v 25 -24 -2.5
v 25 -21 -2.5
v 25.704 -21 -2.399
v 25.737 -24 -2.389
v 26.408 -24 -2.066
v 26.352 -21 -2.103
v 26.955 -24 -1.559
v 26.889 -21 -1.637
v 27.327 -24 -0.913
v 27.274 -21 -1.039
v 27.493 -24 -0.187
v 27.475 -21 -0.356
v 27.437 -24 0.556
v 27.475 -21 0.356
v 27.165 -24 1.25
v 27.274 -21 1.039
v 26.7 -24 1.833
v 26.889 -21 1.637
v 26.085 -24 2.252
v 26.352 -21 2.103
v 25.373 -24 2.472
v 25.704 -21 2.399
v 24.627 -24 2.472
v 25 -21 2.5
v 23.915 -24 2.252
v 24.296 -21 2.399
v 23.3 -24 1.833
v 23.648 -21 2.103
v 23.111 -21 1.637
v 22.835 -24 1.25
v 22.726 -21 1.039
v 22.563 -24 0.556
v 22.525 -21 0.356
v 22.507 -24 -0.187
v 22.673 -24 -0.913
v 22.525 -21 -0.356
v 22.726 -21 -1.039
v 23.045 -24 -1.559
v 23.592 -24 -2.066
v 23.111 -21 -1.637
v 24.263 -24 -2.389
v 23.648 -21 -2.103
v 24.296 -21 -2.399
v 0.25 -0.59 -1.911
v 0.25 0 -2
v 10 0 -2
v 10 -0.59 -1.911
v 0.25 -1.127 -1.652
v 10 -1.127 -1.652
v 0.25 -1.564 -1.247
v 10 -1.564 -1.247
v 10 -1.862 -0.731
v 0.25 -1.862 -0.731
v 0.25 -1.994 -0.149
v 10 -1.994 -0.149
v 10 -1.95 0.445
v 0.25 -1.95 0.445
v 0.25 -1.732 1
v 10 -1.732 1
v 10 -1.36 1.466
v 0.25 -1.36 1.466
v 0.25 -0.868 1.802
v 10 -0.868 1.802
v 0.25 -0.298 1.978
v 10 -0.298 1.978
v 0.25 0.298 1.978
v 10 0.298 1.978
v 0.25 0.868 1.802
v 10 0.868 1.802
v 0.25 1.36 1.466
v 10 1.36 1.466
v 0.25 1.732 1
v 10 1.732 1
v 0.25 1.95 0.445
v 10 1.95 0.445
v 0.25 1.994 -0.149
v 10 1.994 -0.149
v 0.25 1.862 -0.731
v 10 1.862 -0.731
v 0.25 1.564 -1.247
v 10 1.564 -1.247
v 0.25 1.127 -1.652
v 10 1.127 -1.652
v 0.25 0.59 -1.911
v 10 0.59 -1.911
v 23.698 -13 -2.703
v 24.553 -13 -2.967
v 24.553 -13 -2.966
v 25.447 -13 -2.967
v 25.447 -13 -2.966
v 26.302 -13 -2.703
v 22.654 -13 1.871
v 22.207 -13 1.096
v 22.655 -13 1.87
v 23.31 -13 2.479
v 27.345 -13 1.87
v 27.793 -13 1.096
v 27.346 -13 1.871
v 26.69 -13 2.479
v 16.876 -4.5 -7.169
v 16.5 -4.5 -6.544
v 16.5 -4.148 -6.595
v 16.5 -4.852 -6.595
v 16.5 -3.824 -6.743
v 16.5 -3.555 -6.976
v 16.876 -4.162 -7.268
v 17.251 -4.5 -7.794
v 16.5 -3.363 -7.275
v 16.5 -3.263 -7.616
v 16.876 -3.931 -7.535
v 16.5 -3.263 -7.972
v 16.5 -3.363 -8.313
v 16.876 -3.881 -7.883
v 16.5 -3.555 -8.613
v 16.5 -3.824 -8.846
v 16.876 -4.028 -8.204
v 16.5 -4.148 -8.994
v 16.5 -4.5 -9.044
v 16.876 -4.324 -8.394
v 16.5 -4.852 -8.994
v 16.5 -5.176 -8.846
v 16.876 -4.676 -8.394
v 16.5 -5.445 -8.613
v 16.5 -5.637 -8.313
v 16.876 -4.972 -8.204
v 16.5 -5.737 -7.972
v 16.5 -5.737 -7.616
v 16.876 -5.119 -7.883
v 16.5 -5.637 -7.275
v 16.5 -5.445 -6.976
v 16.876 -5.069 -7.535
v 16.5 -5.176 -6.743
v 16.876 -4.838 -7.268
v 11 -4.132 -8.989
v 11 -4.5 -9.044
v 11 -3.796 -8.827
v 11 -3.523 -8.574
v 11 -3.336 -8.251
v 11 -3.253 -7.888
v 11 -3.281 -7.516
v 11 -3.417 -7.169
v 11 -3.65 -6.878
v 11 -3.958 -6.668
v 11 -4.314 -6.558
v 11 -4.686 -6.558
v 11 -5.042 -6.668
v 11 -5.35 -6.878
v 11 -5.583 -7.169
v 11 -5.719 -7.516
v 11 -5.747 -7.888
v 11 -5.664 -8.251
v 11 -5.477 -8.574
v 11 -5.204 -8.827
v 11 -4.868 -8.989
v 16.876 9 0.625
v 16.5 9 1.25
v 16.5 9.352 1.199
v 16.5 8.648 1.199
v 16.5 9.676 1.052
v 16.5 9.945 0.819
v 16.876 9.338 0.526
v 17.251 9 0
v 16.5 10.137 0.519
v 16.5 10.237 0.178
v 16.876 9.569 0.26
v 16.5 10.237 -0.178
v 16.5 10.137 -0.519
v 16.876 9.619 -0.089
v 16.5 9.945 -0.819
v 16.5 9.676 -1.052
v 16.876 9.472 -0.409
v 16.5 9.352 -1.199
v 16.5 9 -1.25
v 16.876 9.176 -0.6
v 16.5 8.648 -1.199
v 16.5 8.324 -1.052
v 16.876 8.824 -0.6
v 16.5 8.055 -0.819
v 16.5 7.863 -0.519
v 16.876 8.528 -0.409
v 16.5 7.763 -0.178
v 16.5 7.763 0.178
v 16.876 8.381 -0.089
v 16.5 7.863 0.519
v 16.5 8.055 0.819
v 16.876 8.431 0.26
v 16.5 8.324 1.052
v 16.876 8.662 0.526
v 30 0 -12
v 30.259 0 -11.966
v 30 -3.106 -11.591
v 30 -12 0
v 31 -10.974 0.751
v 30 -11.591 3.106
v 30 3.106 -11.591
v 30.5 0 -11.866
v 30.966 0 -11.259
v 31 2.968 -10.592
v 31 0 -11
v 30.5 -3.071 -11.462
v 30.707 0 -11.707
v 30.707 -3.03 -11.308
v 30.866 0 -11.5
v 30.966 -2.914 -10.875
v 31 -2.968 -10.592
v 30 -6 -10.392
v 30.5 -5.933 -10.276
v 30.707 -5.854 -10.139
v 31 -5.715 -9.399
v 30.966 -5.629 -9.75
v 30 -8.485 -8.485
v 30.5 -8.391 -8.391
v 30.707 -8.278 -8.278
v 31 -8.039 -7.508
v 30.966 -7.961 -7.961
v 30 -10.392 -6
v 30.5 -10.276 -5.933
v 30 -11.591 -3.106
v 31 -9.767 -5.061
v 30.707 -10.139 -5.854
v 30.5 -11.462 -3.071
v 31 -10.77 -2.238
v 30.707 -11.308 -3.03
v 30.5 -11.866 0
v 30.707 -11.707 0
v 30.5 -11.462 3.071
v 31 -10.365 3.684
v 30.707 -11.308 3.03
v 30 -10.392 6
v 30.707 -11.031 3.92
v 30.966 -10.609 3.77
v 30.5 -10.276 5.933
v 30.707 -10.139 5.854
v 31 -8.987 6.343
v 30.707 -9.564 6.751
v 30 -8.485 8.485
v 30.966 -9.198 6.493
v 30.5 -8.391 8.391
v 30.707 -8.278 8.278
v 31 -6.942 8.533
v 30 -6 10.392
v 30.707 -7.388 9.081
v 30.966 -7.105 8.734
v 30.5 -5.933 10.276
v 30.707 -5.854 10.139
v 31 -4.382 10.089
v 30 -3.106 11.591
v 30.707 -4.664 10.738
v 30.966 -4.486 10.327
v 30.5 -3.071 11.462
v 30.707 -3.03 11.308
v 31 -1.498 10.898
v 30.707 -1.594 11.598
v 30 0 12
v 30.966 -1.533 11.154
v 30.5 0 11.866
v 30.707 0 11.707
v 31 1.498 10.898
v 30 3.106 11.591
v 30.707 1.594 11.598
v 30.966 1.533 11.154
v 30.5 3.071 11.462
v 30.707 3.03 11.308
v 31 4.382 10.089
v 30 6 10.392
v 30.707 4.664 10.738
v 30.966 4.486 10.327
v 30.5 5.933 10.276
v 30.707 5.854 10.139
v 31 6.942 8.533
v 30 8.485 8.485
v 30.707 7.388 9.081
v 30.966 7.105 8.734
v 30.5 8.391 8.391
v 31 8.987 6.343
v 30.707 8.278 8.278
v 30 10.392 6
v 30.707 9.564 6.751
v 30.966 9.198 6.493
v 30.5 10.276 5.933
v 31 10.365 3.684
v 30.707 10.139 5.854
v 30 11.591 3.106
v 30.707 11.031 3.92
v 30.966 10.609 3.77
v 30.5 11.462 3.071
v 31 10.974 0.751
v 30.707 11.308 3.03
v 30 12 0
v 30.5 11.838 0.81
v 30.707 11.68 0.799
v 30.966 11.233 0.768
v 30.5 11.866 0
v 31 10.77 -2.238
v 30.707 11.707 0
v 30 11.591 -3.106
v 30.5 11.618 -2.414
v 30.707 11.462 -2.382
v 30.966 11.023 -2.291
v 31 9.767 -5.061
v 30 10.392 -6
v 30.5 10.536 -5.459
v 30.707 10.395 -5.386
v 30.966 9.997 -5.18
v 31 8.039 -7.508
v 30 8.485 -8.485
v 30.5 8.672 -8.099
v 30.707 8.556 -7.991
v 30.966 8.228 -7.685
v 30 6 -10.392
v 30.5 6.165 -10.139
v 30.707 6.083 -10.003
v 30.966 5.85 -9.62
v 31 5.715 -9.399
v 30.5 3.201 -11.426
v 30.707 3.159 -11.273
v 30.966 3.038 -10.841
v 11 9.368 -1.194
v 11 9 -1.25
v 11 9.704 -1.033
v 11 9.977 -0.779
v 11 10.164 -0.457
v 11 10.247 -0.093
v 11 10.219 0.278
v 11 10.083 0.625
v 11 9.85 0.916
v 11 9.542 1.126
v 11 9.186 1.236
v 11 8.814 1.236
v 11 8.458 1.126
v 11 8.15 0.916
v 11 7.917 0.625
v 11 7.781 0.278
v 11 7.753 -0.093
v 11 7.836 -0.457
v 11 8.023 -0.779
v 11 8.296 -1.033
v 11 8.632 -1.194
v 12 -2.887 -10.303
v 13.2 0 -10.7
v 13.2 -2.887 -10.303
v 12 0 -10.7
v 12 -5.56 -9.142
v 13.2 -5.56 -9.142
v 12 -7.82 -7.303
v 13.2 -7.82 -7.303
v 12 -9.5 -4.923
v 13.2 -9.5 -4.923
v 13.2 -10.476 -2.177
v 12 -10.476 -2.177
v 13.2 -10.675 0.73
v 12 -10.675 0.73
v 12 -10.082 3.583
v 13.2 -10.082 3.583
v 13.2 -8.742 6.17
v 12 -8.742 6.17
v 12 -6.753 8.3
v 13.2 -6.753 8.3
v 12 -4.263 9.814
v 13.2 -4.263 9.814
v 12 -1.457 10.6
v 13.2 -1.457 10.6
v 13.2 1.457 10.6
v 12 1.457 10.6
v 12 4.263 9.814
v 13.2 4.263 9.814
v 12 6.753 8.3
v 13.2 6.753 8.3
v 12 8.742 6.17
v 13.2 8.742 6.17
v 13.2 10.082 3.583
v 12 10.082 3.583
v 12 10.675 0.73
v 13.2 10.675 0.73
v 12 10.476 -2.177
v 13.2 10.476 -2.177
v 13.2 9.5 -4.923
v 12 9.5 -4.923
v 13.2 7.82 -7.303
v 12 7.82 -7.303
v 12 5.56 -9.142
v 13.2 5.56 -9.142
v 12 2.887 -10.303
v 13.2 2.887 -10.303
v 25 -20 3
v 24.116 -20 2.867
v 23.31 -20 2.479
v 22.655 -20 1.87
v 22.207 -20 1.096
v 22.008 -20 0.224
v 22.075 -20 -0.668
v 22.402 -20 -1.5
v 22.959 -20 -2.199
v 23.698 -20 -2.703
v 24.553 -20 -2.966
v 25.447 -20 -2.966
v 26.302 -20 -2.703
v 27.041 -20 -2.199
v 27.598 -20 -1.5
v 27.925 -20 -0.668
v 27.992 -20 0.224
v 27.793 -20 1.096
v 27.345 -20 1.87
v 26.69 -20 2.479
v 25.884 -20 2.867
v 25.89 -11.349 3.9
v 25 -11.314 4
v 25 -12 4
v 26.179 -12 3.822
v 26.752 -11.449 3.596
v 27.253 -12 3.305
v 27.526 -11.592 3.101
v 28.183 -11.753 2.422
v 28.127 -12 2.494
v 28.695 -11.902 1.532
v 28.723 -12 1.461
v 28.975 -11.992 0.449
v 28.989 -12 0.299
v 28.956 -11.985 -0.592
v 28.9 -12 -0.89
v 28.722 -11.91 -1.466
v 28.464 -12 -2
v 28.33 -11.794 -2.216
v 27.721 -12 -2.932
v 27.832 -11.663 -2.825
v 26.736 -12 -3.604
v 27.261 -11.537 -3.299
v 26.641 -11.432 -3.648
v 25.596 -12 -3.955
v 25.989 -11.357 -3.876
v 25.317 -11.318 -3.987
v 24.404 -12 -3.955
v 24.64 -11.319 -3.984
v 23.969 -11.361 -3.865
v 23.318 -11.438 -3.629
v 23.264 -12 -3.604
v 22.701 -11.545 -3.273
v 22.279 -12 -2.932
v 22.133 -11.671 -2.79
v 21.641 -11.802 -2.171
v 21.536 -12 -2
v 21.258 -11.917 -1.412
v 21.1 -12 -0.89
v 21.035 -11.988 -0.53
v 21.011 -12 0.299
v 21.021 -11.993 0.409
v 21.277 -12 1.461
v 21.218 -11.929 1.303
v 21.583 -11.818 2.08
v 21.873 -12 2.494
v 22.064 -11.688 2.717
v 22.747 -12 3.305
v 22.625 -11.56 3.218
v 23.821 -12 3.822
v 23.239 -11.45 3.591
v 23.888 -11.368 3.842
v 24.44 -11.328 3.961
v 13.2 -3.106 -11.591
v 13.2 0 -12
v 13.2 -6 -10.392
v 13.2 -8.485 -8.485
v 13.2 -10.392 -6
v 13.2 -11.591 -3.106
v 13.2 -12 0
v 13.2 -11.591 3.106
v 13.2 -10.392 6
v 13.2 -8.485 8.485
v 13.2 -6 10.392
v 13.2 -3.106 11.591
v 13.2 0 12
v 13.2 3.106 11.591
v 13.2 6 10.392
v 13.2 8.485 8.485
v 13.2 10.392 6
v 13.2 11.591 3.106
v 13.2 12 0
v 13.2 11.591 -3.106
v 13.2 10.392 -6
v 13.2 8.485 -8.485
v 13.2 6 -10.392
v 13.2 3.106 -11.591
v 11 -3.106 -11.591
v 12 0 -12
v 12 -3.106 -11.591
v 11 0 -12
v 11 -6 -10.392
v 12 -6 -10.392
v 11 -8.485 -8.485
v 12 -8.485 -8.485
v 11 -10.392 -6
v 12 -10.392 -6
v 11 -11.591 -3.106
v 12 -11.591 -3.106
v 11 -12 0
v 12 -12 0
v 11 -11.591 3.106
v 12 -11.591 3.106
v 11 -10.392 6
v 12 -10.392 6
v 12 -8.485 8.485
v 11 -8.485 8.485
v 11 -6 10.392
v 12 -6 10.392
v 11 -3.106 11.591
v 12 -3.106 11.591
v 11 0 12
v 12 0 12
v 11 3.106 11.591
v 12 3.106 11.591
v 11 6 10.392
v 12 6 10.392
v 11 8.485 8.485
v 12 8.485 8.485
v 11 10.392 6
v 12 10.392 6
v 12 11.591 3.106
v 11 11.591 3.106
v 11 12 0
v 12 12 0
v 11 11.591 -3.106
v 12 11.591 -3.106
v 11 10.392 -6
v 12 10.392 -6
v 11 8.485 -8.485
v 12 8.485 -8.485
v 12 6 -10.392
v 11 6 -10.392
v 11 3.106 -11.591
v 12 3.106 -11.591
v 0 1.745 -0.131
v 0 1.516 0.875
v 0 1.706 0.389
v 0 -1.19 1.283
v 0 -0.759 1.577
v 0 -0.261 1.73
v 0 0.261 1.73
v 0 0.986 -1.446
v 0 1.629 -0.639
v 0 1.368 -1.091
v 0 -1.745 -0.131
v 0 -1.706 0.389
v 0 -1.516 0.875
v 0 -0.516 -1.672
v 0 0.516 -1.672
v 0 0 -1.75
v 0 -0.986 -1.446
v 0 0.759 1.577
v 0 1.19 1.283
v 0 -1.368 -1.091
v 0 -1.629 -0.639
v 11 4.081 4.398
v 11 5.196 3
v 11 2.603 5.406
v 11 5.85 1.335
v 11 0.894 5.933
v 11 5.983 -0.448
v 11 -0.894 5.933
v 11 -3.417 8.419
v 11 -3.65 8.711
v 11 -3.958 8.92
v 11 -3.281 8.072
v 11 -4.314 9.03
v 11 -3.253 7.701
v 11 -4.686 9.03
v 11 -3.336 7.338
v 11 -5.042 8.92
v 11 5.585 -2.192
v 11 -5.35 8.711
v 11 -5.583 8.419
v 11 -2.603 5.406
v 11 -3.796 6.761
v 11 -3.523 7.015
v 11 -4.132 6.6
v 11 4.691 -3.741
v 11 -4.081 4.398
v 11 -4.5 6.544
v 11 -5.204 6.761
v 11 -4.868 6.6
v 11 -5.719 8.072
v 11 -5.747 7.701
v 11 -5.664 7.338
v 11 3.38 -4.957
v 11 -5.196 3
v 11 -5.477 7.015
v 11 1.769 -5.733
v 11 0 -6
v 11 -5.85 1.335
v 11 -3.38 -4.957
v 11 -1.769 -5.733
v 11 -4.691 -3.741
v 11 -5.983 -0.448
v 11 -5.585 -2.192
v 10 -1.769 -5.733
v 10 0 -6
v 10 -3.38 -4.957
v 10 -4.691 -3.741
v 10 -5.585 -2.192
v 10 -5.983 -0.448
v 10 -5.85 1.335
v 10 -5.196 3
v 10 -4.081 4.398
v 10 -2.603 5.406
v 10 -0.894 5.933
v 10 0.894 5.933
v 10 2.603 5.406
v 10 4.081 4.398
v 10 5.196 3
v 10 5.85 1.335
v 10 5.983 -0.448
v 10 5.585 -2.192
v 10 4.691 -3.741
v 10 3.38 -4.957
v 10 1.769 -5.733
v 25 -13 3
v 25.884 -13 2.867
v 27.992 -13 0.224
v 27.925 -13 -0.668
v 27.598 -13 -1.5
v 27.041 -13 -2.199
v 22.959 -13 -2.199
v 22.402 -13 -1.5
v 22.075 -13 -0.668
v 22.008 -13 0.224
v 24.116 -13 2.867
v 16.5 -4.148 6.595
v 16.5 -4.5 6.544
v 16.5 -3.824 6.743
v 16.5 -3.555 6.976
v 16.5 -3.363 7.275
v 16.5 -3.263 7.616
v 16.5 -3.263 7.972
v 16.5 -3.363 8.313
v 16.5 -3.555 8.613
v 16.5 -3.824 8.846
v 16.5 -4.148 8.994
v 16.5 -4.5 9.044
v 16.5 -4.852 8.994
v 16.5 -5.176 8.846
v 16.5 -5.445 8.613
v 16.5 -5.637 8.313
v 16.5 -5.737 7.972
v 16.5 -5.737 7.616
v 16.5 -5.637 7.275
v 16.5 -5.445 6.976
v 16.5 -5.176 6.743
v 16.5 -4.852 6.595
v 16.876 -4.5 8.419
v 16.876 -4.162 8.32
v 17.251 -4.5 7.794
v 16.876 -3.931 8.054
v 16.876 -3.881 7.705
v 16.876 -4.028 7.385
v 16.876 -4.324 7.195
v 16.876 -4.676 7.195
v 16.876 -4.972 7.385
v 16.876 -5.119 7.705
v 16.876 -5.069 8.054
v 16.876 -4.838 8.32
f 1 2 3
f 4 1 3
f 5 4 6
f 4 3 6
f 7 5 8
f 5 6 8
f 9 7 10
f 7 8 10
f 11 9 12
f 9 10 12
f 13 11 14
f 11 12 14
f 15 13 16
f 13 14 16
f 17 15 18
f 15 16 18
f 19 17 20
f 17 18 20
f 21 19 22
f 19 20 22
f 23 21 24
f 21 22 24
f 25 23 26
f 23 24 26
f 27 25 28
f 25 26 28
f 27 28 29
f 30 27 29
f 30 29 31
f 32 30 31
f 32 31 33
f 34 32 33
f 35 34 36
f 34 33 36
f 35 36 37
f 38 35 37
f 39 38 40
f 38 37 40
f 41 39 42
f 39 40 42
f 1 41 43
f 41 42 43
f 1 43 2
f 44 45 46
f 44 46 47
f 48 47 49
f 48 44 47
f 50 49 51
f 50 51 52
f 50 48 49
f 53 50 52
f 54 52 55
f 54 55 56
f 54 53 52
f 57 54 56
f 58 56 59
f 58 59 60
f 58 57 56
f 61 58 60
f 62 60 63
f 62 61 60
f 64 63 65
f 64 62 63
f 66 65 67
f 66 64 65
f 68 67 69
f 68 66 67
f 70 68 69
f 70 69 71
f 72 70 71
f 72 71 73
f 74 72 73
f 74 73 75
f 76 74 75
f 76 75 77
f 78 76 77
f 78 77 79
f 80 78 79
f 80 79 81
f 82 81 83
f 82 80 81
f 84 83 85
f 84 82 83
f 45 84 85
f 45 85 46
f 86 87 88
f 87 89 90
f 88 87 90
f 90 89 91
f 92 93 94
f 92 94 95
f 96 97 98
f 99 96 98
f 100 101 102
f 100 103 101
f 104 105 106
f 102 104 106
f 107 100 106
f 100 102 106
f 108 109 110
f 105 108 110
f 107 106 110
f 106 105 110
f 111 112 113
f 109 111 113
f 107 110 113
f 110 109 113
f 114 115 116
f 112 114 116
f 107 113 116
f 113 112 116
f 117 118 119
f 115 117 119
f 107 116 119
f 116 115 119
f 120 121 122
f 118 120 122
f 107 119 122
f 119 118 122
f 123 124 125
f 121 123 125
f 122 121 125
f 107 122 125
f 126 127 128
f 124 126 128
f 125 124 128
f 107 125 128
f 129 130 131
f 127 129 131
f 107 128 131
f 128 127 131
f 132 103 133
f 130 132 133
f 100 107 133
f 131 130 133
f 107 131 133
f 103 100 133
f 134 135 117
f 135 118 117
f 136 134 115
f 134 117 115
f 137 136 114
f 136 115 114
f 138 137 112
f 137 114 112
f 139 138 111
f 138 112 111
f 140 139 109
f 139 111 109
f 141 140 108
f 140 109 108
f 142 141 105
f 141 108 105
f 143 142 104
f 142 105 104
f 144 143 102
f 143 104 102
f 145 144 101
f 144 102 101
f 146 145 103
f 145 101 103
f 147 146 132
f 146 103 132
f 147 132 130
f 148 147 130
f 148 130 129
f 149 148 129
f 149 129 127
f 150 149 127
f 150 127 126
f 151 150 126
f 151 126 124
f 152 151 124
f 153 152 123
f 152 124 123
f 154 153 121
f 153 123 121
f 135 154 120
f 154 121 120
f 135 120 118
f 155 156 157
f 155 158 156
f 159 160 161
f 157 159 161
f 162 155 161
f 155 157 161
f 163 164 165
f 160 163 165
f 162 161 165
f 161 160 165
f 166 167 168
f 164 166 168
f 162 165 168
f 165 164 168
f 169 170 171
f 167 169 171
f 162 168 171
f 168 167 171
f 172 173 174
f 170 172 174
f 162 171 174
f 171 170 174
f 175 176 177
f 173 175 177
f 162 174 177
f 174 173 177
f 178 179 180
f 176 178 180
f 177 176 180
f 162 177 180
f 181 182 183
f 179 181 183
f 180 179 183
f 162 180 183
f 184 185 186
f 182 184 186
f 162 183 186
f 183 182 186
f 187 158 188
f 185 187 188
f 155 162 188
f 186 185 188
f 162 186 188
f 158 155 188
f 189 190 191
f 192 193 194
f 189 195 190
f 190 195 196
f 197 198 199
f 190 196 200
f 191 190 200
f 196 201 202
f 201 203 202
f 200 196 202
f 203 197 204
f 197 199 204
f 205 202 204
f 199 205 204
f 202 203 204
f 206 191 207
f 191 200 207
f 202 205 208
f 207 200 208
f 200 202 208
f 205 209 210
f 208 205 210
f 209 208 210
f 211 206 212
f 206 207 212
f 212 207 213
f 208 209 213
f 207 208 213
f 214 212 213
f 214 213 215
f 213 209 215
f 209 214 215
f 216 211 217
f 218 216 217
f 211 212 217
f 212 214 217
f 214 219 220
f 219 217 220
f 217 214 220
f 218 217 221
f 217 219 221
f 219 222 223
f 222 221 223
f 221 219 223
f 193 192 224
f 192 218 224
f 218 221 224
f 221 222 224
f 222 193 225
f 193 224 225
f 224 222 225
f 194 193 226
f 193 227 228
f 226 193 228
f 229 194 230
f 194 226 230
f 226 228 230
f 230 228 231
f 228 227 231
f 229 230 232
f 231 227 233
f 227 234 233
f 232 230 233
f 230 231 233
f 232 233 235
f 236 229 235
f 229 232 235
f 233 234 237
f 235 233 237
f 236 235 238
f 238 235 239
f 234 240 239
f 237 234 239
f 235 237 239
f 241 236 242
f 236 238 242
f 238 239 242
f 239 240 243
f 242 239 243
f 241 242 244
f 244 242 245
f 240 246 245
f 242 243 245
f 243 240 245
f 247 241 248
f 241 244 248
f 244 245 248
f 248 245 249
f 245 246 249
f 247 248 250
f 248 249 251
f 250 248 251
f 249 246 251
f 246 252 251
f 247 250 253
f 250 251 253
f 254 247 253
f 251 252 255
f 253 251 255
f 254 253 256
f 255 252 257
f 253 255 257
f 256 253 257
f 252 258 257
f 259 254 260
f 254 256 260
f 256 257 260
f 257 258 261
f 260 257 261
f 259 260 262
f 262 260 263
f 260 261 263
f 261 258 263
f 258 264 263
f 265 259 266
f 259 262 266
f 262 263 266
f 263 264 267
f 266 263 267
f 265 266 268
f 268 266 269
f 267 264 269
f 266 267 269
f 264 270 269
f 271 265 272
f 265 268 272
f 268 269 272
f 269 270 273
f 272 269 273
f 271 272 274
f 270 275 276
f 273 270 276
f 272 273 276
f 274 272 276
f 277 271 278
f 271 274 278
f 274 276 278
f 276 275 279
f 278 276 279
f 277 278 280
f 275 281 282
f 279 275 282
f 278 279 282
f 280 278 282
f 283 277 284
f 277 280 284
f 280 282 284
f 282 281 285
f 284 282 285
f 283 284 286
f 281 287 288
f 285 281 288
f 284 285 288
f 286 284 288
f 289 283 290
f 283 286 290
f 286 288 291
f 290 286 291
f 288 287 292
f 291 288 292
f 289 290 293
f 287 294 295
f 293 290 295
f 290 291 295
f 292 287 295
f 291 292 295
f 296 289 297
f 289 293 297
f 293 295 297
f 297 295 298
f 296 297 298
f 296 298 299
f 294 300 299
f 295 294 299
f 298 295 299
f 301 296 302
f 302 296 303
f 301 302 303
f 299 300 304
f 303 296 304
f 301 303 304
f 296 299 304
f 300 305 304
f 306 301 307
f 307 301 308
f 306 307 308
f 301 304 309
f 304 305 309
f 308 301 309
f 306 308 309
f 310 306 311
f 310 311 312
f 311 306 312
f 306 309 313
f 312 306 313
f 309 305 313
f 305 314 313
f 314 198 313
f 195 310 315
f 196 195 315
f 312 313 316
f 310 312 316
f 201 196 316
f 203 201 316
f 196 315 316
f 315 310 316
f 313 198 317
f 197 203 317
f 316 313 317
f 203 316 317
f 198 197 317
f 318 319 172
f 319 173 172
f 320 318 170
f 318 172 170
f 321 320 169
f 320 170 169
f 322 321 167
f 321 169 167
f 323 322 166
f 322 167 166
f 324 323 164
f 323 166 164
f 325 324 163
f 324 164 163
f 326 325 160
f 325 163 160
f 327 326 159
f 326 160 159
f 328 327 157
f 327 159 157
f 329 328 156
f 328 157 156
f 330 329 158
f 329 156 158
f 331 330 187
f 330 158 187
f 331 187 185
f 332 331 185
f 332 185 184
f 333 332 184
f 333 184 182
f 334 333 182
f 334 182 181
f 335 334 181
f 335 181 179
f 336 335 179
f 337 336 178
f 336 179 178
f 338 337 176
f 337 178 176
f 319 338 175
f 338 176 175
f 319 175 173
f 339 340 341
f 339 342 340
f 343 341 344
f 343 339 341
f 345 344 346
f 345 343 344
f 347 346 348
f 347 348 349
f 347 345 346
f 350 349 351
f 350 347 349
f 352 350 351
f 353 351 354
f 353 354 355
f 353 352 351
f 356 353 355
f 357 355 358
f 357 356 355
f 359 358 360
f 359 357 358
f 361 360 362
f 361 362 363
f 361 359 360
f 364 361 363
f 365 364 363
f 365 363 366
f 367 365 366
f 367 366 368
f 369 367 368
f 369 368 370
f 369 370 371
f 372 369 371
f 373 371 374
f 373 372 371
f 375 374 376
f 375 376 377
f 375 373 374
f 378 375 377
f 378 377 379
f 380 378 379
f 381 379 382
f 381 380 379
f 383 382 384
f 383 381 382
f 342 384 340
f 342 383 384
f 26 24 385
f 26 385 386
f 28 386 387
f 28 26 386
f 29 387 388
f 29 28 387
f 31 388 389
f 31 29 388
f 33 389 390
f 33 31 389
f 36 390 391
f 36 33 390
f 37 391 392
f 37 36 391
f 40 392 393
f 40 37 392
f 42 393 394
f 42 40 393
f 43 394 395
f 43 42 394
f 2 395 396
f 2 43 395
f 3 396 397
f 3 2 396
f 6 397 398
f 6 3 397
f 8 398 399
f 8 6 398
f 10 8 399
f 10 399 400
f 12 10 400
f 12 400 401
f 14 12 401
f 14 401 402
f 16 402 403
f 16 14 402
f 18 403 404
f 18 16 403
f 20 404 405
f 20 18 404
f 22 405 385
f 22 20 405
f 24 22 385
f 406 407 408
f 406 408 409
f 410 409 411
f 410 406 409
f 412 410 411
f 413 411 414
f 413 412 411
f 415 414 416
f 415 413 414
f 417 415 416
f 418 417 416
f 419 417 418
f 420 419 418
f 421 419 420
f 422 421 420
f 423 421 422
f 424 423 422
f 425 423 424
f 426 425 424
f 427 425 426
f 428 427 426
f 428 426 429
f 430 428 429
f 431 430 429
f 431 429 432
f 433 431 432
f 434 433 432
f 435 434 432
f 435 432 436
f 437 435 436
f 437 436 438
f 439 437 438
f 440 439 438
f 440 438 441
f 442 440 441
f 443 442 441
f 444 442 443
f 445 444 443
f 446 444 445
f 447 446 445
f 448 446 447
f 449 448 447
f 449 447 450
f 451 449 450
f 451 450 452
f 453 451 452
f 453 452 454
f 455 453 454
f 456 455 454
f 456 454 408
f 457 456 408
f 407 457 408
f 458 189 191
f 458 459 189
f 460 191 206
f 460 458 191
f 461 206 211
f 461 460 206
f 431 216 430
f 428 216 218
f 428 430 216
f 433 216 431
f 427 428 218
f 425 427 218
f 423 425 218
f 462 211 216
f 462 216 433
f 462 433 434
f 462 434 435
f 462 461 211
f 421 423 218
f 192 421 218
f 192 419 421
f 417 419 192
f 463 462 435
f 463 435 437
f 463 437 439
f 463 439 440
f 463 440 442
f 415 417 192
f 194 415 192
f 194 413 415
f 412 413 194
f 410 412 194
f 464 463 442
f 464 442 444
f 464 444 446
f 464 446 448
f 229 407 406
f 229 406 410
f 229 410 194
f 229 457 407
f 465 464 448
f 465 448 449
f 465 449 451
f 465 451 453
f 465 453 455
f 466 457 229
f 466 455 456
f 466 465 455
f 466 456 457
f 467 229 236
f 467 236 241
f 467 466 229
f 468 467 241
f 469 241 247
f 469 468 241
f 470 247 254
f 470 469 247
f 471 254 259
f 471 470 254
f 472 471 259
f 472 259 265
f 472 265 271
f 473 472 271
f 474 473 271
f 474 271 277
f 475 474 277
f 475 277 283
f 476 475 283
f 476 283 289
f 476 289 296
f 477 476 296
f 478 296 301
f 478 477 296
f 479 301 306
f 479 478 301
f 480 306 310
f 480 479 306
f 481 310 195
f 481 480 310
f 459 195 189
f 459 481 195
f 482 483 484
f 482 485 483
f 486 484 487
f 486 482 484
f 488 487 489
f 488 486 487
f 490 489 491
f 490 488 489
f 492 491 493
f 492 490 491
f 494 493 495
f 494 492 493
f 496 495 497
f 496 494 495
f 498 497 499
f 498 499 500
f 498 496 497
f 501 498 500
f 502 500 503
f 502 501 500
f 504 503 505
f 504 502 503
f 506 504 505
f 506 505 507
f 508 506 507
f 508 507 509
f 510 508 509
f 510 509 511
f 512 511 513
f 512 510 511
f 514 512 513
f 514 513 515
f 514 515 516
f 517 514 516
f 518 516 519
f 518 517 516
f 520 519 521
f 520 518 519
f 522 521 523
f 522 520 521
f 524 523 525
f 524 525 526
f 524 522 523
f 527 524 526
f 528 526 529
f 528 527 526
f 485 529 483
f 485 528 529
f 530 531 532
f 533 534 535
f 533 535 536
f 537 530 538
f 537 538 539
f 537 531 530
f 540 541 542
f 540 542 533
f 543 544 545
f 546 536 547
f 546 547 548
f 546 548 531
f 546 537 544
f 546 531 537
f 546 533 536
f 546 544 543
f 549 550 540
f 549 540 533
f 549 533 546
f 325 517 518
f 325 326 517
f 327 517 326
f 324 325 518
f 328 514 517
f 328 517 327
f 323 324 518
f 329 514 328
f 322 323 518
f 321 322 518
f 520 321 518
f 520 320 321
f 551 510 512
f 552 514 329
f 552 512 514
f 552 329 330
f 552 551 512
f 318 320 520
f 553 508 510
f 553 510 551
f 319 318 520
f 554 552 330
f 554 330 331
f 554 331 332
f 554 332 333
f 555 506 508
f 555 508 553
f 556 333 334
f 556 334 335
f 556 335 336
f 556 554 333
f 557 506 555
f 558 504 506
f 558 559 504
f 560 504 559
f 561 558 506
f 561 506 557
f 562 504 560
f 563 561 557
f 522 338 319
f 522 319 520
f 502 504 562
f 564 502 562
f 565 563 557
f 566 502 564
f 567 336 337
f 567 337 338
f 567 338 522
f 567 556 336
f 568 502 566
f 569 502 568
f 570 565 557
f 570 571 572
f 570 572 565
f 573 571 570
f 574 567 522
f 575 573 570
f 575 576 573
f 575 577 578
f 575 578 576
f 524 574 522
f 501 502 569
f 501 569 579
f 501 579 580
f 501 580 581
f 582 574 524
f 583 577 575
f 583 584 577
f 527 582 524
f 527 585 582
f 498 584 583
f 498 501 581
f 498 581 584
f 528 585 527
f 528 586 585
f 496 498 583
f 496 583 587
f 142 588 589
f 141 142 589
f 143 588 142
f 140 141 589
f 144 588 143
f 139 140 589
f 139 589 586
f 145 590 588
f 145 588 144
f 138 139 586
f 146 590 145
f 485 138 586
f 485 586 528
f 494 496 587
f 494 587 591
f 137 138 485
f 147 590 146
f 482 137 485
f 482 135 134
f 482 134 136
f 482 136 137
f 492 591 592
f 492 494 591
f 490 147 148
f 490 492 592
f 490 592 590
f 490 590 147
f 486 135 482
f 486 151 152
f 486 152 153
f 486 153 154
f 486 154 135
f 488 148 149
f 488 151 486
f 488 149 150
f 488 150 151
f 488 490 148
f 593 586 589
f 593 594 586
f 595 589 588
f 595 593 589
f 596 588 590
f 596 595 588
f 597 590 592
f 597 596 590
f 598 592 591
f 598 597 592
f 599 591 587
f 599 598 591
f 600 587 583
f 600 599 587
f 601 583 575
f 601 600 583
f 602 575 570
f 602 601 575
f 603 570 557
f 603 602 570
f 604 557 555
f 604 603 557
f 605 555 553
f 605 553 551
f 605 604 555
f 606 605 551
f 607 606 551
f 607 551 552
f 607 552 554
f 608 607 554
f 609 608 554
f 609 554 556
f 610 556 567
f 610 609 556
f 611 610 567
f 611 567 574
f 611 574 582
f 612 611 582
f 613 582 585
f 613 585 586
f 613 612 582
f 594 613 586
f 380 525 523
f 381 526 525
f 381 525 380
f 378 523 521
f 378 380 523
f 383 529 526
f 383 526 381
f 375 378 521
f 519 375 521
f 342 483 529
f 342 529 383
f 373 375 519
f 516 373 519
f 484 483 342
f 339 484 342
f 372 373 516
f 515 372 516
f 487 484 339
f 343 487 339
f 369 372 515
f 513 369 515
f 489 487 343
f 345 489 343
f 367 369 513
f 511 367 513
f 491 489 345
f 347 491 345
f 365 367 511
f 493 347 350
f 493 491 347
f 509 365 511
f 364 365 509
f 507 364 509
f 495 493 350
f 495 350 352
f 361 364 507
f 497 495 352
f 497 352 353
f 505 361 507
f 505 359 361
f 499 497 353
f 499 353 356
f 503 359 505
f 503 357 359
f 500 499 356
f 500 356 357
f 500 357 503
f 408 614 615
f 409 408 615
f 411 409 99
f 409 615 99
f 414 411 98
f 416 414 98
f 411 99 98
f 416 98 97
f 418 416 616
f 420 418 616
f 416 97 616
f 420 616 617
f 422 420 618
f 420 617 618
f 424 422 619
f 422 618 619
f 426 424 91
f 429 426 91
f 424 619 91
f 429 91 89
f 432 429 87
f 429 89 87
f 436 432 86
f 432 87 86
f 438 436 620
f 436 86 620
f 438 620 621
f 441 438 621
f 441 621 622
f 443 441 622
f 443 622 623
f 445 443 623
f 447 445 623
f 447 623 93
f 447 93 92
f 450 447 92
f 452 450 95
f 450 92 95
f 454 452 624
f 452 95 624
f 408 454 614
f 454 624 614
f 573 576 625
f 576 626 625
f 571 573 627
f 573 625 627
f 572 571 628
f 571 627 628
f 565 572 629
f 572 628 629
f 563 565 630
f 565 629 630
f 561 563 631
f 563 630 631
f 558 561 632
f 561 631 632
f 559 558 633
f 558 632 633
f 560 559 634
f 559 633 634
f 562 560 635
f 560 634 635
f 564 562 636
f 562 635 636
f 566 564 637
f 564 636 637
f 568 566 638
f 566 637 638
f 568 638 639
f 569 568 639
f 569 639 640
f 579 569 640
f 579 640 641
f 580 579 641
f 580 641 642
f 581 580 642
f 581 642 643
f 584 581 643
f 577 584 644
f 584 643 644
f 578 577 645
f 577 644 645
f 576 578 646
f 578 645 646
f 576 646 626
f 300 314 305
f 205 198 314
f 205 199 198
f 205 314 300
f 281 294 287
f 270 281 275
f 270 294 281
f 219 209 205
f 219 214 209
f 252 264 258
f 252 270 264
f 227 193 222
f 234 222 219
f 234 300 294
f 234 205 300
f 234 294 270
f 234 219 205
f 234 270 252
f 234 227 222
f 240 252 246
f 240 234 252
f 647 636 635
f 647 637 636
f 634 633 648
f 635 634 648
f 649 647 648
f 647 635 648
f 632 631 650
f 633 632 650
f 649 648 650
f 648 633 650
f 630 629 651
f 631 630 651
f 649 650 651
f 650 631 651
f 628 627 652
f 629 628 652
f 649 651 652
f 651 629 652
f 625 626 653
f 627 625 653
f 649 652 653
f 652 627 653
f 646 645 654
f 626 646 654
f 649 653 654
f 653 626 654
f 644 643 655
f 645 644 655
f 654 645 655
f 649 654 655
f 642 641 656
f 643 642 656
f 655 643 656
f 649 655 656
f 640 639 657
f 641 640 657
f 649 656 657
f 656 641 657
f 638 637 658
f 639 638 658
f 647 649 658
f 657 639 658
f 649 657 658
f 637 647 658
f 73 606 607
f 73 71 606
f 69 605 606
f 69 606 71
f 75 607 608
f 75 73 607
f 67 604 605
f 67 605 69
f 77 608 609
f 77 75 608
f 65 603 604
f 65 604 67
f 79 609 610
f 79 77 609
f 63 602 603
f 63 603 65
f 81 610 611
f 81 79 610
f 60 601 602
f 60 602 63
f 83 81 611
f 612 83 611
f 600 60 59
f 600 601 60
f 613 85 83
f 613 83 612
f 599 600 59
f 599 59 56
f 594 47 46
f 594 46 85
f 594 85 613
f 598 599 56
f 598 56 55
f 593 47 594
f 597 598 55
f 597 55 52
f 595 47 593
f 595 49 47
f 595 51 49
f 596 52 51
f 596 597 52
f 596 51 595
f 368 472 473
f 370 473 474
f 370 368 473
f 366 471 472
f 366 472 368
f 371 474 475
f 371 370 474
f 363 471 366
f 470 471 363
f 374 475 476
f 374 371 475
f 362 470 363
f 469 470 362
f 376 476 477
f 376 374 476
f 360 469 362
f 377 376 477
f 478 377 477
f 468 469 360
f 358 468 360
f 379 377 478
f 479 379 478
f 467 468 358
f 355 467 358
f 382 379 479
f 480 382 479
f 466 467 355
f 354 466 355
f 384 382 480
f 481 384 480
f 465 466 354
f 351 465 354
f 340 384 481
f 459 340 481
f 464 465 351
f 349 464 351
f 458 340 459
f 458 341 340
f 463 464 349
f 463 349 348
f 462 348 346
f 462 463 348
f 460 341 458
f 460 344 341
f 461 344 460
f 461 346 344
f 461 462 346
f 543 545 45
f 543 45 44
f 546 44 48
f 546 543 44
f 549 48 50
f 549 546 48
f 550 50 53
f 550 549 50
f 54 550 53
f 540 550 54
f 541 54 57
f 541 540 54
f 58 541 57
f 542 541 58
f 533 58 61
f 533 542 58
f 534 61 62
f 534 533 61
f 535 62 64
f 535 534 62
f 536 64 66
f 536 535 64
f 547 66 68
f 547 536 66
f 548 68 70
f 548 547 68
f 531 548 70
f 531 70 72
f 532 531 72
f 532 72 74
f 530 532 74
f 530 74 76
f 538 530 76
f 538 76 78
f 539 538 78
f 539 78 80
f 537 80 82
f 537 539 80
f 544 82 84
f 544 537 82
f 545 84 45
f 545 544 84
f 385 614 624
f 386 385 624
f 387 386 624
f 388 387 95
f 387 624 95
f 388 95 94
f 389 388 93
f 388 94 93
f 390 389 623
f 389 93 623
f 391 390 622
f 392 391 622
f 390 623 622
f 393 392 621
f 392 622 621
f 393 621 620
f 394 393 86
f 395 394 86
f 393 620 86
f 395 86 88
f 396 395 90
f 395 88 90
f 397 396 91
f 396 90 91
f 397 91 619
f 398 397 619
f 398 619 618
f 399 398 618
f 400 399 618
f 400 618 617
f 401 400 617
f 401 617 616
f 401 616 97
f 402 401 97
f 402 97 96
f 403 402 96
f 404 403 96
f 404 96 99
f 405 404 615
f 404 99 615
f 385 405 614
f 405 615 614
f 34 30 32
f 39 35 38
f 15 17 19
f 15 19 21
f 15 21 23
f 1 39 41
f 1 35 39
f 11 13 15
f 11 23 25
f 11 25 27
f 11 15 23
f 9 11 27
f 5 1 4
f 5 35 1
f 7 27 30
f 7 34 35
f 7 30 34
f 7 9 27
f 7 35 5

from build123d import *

# Parameters (mm, degrees)
CHAMFER1_SIZE  = 0.25
FILLET1_R      = 1
SKETCH2_R      = 4
EXTRUDE1_DEPTH = 13
SKETCH3_R      = 3
EXTRUDE2_DEPTH = 8
SKETCH4_R      = 2.5
EXTRUDE3_DEPTH = 3
CHAMFER2_SIZE  = 1
CHAMFER3_SIZE2 = 0.5
CHAMFER3_SIZE  = 1
HOLEWZD1_D     = 2.5
HOLEWZD1_DEPTH = 5.5
HOLEWZD1_TIP   = 0.751075774


with BuildPart() as part:
    # Sketch1 → Revolve1 (revolve)
    with BuildSketch(Plane.XY, mode=Mode.PRIVATE) as revolve1_sk:
        Polygon((0, 0), (31, 0), (31, 12), (13.2, 12), (13.2, 10.7), (12, 10.7), (12, 12), (11, 12), (11, 6), (10, 6), (10, 2), (0, 2), align=None)
    revolve(revolve1_sk.sketch.rotate(Axis((0, 0, 0), (-1, 0, 0)), 90), axis=Axis((0, 0, 0), (-1, 0, 0)))

    # Chamfer1
    chamfer1_edges = [part.edges().sort_by_distance(p)[0] for p in [
        (0, 0, 2),
    ]]
    chamfer(chamfer1_edges, length=CHAMFER1_SIZE)

    # Fillet1
    fillet1_edges = [part.edges().sort_by_distance(p)[0] for p in [
        (31, 0, 12),
    ]]
    fillet(fillet1_edges, radius=FILLET1_R)

    # Sketch2 → Extrude1 (add)
    with BuildSketch(Plane(origin=(0, 0, 0), x_dir=(1, 0, 0), z_dir=(0, 1, 0))):
        with Locations(Location((25, 0, 0), (0, 0, 270))):
            Circle(SKETCH2_R)
    extrude(amount=-EXTRUDE1_DEPTH)

    # Sketch3 → Extrude2 (add)
    with BuildSketch(Plane.XZ.offset(13)):
        with Locations(Location((25, 0, 0), (0, 0, 90))):
            Circle(SKETCH3_R)
    extrude(amount=EXTRUDE2_DEPTH)

    # Sketch4 → Extrude3 (add)
    with BuildSketch(Plane.XZ.offset(21)):
        with Locations(Location((25, 0, 0), (0, 0, 270))):
            Circle(SKETCH4_R)
    extrude(amount=EXTRUDE3_DEPTH)

    # Chamfer2
    chamfer2_edges = [part.edges().sort_by_distance(p)[0] for p in [
        (25, -13, -4),
    ]]
    chamfer(chamfer2_edges, length=CHAMFER2_SIZE - 0.0001)  # a hair under: the kernel refuses the full size

    # Chamfer3
    chamfer3_edges = [part.edges().sort_by_distance(p)[0] for p in [
        (25, -21, -3),
    ]]
    chamfer3_side = [part.faces().sort_by_distance(p)[0] for p in [
        (25, -20.99, -3),
    ]]
    chamfer(chamfer3_edges, length=CHAMFER3_SIZE - 0.0001, length2=CHAMFER3_SIZE2 - 0.0001, reference=chamfer3_side[0])  # a hair under: the kernel refuses the full size

    # HoleWzd1
    with Locations(Plane.ZY.offset(-11)):
        with Locations((0, 9), (7.794228634, -4.5), (-7.794228634, -4.5)):
            Hole(HOLEWZD1_D / 2, depth=HOLEWZD1_DEPTH)
            with Locations((0, 0, -(HOLEWZD1_DEPTH + HOLEWZD1_TIP / 2))):  # 118° drill point
                Cone(0, HOLEWZD1_D / 2, HOLEWZD1_TIP, mode=Mode.SUBTRACT)


solid = part.part
